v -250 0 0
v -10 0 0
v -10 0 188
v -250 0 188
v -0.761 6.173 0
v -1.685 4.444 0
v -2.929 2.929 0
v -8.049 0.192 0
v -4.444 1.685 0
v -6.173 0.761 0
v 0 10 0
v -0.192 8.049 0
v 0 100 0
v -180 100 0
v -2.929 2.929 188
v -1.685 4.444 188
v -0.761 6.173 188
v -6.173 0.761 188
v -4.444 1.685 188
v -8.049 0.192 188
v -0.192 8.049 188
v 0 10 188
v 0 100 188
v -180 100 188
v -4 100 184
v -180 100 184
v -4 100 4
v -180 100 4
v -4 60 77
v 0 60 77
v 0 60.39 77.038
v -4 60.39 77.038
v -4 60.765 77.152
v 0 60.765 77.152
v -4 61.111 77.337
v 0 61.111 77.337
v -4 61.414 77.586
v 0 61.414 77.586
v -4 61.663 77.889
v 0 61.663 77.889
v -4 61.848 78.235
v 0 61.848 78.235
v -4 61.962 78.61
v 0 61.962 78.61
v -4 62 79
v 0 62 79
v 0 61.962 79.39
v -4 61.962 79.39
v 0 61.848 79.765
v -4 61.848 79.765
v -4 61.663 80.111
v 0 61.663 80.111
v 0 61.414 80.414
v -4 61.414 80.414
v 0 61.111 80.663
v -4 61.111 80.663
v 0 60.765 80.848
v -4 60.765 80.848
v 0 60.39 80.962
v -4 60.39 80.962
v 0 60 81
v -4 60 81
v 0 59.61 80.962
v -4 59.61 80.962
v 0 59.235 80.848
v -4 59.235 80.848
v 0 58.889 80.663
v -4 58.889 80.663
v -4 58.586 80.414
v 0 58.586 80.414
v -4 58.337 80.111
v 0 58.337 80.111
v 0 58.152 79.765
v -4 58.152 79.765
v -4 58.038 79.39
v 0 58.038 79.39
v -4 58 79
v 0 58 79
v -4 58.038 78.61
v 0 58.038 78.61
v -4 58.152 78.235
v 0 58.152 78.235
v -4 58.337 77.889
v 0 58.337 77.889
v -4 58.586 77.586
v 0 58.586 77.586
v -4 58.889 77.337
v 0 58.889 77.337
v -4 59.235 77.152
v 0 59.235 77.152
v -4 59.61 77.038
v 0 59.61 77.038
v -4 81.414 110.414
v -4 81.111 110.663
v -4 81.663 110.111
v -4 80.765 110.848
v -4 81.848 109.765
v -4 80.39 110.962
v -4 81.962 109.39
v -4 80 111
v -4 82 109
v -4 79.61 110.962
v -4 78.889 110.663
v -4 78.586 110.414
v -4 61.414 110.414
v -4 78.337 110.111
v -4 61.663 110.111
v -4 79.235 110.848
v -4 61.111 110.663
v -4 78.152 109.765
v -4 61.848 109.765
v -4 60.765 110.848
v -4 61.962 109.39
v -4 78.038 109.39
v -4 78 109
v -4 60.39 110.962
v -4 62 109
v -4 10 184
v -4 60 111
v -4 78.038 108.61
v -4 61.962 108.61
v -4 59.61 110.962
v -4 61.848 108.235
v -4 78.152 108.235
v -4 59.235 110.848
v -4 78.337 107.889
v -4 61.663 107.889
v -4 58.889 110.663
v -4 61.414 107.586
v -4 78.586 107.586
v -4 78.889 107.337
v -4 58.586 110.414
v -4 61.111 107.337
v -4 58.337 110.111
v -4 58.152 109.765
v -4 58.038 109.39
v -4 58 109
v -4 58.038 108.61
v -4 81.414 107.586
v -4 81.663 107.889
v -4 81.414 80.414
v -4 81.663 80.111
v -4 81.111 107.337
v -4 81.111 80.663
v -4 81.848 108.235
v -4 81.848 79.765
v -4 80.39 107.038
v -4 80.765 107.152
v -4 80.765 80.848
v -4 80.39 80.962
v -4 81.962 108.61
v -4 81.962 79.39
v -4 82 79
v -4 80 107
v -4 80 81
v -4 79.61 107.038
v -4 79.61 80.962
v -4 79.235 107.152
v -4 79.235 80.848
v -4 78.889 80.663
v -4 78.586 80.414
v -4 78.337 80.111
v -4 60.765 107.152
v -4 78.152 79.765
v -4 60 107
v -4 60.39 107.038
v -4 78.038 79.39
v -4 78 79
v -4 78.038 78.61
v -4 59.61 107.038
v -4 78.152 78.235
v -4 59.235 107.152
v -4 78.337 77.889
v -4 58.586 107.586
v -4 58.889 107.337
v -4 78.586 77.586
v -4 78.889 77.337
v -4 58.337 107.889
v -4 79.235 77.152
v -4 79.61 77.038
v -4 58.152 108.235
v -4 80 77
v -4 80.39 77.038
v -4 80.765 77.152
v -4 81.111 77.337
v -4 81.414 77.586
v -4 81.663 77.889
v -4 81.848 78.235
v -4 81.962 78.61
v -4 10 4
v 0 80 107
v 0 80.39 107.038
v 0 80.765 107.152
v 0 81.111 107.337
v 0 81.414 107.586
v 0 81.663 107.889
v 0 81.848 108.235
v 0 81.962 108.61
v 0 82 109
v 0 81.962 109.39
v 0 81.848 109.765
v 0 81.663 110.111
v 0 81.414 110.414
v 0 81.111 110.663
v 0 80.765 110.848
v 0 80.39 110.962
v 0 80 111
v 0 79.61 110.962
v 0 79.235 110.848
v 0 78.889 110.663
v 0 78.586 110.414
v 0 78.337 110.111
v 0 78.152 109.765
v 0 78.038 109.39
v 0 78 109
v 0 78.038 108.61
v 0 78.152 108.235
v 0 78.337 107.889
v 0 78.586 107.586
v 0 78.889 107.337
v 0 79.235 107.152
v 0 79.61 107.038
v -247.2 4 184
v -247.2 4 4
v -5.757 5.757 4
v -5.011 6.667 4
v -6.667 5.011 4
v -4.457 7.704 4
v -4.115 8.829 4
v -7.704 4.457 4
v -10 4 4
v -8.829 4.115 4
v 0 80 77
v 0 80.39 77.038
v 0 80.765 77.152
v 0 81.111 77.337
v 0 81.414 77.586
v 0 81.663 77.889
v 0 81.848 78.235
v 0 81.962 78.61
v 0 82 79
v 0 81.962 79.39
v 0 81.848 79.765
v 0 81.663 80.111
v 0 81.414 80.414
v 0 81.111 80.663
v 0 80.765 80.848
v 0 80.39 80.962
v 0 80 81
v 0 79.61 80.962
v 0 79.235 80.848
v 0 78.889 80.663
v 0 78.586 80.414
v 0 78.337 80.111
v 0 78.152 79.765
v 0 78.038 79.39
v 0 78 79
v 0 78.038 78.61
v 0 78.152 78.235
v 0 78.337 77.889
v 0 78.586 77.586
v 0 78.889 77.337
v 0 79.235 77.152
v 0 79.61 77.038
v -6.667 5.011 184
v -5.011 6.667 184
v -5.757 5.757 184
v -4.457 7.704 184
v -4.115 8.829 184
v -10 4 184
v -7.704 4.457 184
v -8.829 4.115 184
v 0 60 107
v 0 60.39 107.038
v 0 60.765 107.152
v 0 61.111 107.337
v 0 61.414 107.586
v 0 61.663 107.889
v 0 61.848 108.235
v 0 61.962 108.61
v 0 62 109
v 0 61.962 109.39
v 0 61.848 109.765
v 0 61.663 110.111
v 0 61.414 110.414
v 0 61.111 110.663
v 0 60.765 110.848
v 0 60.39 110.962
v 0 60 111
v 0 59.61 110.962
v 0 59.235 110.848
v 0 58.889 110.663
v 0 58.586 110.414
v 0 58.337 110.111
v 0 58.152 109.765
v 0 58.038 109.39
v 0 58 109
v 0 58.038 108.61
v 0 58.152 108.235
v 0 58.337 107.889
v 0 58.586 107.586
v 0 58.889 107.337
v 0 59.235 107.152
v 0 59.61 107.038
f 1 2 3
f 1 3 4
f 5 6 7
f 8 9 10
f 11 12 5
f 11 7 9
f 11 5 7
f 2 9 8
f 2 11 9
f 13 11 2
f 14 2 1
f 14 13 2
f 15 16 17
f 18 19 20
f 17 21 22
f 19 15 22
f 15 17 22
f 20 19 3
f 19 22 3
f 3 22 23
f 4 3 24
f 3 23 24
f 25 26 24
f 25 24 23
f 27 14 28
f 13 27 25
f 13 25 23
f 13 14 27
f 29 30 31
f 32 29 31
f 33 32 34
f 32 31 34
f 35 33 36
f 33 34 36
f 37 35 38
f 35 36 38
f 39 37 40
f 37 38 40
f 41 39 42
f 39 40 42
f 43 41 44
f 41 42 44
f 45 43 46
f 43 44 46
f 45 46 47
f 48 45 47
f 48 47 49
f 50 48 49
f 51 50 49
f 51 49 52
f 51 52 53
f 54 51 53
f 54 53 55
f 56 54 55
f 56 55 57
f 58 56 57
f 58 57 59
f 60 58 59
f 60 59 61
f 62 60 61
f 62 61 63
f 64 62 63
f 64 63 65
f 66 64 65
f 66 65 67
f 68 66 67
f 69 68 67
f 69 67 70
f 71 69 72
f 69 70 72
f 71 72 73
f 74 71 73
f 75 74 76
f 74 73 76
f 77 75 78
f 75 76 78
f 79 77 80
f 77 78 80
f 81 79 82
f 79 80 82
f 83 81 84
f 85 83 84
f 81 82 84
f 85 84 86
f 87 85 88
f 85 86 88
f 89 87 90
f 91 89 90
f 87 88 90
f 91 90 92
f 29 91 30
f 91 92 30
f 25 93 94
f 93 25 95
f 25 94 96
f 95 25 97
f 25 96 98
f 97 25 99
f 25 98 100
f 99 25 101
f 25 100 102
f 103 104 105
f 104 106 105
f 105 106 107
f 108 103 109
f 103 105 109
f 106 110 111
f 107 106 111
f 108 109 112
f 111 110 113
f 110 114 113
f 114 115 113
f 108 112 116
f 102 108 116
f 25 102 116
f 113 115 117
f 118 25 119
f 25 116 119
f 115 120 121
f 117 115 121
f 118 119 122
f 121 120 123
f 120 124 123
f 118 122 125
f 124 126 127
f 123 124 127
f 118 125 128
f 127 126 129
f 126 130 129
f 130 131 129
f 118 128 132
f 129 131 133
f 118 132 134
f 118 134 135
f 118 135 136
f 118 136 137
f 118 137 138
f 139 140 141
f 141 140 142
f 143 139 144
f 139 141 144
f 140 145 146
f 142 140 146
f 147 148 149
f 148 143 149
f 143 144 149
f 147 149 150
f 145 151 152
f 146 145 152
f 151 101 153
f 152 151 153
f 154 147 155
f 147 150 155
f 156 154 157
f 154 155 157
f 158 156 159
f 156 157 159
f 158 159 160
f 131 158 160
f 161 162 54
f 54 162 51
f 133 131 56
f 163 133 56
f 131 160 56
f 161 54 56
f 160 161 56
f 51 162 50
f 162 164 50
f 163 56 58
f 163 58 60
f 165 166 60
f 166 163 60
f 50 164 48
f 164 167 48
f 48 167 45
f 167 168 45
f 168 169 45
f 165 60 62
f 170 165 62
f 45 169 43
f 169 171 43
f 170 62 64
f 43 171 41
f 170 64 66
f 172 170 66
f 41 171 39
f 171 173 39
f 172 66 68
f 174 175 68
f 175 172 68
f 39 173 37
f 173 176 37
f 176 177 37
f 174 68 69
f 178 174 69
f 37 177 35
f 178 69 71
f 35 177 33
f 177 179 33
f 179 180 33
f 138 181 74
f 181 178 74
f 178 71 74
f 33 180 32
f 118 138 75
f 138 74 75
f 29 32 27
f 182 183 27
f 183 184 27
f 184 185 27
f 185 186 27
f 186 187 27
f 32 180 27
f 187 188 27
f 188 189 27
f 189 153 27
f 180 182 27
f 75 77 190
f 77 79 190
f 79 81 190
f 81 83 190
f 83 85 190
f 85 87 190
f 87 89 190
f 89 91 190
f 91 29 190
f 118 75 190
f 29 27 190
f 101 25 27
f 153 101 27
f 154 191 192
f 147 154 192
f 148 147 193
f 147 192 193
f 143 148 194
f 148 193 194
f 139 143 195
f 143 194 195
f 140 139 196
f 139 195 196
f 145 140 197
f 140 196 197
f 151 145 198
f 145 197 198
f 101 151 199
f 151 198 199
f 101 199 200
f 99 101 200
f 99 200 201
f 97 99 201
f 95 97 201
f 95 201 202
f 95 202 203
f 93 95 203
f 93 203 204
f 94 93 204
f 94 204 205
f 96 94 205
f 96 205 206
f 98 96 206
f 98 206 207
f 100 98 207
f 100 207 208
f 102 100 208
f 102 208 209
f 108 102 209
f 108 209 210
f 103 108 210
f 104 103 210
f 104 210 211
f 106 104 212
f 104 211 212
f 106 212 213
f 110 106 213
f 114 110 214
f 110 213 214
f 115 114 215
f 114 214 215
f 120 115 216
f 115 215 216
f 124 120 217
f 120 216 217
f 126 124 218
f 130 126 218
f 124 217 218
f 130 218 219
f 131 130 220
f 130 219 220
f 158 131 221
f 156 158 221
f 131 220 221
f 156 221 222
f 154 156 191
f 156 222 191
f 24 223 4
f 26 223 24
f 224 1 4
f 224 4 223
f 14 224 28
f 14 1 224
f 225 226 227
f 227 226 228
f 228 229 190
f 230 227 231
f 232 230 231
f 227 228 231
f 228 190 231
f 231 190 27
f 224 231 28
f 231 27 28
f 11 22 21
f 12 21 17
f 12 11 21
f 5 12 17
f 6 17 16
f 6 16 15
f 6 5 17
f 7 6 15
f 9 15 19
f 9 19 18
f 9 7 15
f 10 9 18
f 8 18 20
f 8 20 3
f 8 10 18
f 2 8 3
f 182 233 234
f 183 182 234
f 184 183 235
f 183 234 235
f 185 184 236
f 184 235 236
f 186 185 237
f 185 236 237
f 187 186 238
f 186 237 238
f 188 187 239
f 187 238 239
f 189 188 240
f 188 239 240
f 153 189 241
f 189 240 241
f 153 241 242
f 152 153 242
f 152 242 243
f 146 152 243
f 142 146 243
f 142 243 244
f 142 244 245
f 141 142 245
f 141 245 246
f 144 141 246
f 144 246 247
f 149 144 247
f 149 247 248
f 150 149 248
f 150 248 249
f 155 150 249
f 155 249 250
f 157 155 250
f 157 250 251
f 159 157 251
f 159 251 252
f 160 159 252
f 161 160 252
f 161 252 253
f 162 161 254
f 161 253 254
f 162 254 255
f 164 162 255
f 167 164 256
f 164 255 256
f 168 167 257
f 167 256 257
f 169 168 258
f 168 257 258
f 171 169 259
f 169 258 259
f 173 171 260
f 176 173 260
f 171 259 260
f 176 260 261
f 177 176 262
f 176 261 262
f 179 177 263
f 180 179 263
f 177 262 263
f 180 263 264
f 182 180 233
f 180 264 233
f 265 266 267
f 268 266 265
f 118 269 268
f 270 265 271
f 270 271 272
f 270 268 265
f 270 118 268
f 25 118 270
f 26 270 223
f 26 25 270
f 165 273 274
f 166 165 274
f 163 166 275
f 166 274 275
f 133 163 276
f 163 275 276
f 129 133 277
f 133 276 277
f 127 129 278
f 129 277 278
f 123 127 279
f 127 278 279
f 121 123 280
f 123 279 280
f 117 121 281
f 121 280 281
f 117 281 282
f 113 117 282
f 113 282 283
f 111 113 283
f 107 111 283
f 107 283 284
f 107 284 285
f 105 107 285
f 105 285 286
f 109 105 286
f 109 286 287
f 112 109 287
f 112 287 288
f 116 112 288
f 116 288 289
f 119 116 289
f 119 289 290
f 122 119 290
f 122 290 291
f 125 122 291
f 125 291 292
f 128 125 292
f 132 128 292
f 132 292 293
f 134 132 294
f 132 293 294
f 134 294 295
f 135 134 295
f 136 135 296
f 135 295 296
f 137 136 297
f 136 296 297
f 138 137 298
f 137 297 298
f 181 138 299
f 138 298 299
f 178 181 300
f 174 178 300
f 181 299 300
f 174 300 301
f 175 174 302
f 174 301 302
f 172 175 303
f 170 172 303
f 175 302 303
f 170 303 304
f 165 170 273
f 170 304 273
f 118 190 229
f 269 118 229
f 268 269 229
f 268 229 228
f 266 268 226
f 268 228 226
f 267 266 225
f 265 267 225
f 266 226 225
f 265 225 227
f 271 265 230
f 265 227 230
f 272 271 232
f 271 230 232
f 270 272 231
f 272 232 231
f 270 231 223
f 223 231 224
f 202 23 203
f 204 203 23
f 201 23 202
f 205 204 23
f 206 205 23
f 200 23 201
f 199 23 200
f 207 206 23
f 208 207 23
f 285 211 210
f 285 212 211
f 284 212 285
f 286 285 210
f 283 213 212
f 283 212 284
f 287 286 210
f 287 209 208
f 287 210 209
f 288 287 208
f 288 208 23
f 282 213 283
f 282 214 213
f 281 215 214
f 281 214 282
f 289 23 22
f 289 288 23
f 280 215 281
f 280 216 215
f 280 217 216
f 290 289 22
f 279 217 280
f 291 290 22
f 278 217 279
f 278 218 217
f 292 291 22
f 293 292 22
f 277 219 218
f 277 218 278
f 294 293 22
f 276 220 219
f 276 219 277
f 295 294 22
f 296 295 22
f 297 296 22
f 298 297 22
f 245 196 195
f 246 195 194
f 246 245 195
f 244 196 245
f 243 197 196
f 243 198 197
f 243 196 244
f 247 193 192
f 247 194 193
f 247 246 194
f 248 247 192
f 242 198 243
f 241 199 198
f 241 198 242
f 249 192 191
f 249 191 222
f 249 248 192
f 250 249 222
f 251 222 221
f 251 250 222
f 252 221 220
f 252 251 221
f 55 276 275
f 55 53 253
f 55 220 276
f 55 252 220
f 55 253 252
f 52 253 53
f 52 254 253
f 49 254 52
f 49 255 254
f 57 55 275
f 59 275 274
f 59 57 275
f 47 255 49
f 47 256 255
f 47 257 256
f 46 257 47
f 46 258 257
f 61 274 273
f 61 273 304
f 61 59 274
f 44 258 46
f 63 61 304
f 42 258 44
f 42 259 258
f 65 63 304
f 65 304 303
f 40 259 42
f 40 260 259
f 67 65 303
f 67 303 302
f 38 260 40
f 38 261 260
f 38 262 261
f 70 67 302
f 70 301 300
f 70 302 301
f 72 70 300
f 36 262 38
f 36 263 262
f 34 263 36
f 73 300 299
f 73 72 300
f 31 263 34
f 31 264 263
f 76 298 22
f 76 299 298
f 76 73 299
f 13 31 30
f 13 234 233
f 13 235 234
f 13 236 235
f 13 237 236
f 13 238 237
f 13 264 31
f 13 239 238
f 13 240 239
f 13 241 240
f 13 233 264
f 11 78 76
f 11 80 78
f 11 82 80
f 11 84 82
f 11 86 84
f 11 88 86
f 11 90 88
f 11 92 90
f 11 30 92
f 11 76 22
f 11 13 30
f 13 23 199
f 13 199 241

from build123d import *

# Parameters (mm, degrees)
DODANIE_WYCI_GNI_CIE1_DEPTH = 188
SKORUPA1_T                  = -4
SZKIC2_R                    = 2
WYTNIJ_WYCI_GNI_CIE1_DEPTH  = 120


with BuildPart() as part:
    # Szkic1 → Dodanie-wyciągnięcie1 (new body)
    with BuildSketch(Plane.XY):
        with BuildLine():
            Line((-10, 0), (-250, 0))
            Line((-250, 0), (-180, 100))
            Line((-180, 100), (0, 100))
            Line((0, 100), (0, 10))
            ThreePointArc((0, 10), (-2.928932188, 2.928932188), (-10, 0))
        make_face()
    extrude(amount=DODANIE_WYCI_GNI_CIE1_DEPTH)

    # Skorupa1
    skorupa1_openings = [part.faces().sort_by_distance(p)[0] for p in [
        (-90, 100, 94),
        (-215, 50, 94),
    ]]
    offset(amount=SKORUPA1_T, openings=skorupa1_openings, kind=Kind.INTERSECTION)

    # Szkic2 → Wytnij-wyciągnięcie1 (cut)
    with BuildSketch(Plane(origin=(0, 0, 0), x_dir=(0, 0, -1), z_dir=(1, 0, 0))):
        with Locations((-109, 80)):
            Circle(SZKIC2_R)
        with Locations((-79, 80)):
            Circle(SZKIC2_R)
        with Locations((-79, 60)):
            Circle(SZKIC2_R)
        with Locations((-109, 60)):
            Circle(SZKIC2_R)
    extrude(amount=-WYTNIJ_WYCI_GNI_CIE1_DEPTH, mode=Mode.SUBTRACT)


solid = part.part
